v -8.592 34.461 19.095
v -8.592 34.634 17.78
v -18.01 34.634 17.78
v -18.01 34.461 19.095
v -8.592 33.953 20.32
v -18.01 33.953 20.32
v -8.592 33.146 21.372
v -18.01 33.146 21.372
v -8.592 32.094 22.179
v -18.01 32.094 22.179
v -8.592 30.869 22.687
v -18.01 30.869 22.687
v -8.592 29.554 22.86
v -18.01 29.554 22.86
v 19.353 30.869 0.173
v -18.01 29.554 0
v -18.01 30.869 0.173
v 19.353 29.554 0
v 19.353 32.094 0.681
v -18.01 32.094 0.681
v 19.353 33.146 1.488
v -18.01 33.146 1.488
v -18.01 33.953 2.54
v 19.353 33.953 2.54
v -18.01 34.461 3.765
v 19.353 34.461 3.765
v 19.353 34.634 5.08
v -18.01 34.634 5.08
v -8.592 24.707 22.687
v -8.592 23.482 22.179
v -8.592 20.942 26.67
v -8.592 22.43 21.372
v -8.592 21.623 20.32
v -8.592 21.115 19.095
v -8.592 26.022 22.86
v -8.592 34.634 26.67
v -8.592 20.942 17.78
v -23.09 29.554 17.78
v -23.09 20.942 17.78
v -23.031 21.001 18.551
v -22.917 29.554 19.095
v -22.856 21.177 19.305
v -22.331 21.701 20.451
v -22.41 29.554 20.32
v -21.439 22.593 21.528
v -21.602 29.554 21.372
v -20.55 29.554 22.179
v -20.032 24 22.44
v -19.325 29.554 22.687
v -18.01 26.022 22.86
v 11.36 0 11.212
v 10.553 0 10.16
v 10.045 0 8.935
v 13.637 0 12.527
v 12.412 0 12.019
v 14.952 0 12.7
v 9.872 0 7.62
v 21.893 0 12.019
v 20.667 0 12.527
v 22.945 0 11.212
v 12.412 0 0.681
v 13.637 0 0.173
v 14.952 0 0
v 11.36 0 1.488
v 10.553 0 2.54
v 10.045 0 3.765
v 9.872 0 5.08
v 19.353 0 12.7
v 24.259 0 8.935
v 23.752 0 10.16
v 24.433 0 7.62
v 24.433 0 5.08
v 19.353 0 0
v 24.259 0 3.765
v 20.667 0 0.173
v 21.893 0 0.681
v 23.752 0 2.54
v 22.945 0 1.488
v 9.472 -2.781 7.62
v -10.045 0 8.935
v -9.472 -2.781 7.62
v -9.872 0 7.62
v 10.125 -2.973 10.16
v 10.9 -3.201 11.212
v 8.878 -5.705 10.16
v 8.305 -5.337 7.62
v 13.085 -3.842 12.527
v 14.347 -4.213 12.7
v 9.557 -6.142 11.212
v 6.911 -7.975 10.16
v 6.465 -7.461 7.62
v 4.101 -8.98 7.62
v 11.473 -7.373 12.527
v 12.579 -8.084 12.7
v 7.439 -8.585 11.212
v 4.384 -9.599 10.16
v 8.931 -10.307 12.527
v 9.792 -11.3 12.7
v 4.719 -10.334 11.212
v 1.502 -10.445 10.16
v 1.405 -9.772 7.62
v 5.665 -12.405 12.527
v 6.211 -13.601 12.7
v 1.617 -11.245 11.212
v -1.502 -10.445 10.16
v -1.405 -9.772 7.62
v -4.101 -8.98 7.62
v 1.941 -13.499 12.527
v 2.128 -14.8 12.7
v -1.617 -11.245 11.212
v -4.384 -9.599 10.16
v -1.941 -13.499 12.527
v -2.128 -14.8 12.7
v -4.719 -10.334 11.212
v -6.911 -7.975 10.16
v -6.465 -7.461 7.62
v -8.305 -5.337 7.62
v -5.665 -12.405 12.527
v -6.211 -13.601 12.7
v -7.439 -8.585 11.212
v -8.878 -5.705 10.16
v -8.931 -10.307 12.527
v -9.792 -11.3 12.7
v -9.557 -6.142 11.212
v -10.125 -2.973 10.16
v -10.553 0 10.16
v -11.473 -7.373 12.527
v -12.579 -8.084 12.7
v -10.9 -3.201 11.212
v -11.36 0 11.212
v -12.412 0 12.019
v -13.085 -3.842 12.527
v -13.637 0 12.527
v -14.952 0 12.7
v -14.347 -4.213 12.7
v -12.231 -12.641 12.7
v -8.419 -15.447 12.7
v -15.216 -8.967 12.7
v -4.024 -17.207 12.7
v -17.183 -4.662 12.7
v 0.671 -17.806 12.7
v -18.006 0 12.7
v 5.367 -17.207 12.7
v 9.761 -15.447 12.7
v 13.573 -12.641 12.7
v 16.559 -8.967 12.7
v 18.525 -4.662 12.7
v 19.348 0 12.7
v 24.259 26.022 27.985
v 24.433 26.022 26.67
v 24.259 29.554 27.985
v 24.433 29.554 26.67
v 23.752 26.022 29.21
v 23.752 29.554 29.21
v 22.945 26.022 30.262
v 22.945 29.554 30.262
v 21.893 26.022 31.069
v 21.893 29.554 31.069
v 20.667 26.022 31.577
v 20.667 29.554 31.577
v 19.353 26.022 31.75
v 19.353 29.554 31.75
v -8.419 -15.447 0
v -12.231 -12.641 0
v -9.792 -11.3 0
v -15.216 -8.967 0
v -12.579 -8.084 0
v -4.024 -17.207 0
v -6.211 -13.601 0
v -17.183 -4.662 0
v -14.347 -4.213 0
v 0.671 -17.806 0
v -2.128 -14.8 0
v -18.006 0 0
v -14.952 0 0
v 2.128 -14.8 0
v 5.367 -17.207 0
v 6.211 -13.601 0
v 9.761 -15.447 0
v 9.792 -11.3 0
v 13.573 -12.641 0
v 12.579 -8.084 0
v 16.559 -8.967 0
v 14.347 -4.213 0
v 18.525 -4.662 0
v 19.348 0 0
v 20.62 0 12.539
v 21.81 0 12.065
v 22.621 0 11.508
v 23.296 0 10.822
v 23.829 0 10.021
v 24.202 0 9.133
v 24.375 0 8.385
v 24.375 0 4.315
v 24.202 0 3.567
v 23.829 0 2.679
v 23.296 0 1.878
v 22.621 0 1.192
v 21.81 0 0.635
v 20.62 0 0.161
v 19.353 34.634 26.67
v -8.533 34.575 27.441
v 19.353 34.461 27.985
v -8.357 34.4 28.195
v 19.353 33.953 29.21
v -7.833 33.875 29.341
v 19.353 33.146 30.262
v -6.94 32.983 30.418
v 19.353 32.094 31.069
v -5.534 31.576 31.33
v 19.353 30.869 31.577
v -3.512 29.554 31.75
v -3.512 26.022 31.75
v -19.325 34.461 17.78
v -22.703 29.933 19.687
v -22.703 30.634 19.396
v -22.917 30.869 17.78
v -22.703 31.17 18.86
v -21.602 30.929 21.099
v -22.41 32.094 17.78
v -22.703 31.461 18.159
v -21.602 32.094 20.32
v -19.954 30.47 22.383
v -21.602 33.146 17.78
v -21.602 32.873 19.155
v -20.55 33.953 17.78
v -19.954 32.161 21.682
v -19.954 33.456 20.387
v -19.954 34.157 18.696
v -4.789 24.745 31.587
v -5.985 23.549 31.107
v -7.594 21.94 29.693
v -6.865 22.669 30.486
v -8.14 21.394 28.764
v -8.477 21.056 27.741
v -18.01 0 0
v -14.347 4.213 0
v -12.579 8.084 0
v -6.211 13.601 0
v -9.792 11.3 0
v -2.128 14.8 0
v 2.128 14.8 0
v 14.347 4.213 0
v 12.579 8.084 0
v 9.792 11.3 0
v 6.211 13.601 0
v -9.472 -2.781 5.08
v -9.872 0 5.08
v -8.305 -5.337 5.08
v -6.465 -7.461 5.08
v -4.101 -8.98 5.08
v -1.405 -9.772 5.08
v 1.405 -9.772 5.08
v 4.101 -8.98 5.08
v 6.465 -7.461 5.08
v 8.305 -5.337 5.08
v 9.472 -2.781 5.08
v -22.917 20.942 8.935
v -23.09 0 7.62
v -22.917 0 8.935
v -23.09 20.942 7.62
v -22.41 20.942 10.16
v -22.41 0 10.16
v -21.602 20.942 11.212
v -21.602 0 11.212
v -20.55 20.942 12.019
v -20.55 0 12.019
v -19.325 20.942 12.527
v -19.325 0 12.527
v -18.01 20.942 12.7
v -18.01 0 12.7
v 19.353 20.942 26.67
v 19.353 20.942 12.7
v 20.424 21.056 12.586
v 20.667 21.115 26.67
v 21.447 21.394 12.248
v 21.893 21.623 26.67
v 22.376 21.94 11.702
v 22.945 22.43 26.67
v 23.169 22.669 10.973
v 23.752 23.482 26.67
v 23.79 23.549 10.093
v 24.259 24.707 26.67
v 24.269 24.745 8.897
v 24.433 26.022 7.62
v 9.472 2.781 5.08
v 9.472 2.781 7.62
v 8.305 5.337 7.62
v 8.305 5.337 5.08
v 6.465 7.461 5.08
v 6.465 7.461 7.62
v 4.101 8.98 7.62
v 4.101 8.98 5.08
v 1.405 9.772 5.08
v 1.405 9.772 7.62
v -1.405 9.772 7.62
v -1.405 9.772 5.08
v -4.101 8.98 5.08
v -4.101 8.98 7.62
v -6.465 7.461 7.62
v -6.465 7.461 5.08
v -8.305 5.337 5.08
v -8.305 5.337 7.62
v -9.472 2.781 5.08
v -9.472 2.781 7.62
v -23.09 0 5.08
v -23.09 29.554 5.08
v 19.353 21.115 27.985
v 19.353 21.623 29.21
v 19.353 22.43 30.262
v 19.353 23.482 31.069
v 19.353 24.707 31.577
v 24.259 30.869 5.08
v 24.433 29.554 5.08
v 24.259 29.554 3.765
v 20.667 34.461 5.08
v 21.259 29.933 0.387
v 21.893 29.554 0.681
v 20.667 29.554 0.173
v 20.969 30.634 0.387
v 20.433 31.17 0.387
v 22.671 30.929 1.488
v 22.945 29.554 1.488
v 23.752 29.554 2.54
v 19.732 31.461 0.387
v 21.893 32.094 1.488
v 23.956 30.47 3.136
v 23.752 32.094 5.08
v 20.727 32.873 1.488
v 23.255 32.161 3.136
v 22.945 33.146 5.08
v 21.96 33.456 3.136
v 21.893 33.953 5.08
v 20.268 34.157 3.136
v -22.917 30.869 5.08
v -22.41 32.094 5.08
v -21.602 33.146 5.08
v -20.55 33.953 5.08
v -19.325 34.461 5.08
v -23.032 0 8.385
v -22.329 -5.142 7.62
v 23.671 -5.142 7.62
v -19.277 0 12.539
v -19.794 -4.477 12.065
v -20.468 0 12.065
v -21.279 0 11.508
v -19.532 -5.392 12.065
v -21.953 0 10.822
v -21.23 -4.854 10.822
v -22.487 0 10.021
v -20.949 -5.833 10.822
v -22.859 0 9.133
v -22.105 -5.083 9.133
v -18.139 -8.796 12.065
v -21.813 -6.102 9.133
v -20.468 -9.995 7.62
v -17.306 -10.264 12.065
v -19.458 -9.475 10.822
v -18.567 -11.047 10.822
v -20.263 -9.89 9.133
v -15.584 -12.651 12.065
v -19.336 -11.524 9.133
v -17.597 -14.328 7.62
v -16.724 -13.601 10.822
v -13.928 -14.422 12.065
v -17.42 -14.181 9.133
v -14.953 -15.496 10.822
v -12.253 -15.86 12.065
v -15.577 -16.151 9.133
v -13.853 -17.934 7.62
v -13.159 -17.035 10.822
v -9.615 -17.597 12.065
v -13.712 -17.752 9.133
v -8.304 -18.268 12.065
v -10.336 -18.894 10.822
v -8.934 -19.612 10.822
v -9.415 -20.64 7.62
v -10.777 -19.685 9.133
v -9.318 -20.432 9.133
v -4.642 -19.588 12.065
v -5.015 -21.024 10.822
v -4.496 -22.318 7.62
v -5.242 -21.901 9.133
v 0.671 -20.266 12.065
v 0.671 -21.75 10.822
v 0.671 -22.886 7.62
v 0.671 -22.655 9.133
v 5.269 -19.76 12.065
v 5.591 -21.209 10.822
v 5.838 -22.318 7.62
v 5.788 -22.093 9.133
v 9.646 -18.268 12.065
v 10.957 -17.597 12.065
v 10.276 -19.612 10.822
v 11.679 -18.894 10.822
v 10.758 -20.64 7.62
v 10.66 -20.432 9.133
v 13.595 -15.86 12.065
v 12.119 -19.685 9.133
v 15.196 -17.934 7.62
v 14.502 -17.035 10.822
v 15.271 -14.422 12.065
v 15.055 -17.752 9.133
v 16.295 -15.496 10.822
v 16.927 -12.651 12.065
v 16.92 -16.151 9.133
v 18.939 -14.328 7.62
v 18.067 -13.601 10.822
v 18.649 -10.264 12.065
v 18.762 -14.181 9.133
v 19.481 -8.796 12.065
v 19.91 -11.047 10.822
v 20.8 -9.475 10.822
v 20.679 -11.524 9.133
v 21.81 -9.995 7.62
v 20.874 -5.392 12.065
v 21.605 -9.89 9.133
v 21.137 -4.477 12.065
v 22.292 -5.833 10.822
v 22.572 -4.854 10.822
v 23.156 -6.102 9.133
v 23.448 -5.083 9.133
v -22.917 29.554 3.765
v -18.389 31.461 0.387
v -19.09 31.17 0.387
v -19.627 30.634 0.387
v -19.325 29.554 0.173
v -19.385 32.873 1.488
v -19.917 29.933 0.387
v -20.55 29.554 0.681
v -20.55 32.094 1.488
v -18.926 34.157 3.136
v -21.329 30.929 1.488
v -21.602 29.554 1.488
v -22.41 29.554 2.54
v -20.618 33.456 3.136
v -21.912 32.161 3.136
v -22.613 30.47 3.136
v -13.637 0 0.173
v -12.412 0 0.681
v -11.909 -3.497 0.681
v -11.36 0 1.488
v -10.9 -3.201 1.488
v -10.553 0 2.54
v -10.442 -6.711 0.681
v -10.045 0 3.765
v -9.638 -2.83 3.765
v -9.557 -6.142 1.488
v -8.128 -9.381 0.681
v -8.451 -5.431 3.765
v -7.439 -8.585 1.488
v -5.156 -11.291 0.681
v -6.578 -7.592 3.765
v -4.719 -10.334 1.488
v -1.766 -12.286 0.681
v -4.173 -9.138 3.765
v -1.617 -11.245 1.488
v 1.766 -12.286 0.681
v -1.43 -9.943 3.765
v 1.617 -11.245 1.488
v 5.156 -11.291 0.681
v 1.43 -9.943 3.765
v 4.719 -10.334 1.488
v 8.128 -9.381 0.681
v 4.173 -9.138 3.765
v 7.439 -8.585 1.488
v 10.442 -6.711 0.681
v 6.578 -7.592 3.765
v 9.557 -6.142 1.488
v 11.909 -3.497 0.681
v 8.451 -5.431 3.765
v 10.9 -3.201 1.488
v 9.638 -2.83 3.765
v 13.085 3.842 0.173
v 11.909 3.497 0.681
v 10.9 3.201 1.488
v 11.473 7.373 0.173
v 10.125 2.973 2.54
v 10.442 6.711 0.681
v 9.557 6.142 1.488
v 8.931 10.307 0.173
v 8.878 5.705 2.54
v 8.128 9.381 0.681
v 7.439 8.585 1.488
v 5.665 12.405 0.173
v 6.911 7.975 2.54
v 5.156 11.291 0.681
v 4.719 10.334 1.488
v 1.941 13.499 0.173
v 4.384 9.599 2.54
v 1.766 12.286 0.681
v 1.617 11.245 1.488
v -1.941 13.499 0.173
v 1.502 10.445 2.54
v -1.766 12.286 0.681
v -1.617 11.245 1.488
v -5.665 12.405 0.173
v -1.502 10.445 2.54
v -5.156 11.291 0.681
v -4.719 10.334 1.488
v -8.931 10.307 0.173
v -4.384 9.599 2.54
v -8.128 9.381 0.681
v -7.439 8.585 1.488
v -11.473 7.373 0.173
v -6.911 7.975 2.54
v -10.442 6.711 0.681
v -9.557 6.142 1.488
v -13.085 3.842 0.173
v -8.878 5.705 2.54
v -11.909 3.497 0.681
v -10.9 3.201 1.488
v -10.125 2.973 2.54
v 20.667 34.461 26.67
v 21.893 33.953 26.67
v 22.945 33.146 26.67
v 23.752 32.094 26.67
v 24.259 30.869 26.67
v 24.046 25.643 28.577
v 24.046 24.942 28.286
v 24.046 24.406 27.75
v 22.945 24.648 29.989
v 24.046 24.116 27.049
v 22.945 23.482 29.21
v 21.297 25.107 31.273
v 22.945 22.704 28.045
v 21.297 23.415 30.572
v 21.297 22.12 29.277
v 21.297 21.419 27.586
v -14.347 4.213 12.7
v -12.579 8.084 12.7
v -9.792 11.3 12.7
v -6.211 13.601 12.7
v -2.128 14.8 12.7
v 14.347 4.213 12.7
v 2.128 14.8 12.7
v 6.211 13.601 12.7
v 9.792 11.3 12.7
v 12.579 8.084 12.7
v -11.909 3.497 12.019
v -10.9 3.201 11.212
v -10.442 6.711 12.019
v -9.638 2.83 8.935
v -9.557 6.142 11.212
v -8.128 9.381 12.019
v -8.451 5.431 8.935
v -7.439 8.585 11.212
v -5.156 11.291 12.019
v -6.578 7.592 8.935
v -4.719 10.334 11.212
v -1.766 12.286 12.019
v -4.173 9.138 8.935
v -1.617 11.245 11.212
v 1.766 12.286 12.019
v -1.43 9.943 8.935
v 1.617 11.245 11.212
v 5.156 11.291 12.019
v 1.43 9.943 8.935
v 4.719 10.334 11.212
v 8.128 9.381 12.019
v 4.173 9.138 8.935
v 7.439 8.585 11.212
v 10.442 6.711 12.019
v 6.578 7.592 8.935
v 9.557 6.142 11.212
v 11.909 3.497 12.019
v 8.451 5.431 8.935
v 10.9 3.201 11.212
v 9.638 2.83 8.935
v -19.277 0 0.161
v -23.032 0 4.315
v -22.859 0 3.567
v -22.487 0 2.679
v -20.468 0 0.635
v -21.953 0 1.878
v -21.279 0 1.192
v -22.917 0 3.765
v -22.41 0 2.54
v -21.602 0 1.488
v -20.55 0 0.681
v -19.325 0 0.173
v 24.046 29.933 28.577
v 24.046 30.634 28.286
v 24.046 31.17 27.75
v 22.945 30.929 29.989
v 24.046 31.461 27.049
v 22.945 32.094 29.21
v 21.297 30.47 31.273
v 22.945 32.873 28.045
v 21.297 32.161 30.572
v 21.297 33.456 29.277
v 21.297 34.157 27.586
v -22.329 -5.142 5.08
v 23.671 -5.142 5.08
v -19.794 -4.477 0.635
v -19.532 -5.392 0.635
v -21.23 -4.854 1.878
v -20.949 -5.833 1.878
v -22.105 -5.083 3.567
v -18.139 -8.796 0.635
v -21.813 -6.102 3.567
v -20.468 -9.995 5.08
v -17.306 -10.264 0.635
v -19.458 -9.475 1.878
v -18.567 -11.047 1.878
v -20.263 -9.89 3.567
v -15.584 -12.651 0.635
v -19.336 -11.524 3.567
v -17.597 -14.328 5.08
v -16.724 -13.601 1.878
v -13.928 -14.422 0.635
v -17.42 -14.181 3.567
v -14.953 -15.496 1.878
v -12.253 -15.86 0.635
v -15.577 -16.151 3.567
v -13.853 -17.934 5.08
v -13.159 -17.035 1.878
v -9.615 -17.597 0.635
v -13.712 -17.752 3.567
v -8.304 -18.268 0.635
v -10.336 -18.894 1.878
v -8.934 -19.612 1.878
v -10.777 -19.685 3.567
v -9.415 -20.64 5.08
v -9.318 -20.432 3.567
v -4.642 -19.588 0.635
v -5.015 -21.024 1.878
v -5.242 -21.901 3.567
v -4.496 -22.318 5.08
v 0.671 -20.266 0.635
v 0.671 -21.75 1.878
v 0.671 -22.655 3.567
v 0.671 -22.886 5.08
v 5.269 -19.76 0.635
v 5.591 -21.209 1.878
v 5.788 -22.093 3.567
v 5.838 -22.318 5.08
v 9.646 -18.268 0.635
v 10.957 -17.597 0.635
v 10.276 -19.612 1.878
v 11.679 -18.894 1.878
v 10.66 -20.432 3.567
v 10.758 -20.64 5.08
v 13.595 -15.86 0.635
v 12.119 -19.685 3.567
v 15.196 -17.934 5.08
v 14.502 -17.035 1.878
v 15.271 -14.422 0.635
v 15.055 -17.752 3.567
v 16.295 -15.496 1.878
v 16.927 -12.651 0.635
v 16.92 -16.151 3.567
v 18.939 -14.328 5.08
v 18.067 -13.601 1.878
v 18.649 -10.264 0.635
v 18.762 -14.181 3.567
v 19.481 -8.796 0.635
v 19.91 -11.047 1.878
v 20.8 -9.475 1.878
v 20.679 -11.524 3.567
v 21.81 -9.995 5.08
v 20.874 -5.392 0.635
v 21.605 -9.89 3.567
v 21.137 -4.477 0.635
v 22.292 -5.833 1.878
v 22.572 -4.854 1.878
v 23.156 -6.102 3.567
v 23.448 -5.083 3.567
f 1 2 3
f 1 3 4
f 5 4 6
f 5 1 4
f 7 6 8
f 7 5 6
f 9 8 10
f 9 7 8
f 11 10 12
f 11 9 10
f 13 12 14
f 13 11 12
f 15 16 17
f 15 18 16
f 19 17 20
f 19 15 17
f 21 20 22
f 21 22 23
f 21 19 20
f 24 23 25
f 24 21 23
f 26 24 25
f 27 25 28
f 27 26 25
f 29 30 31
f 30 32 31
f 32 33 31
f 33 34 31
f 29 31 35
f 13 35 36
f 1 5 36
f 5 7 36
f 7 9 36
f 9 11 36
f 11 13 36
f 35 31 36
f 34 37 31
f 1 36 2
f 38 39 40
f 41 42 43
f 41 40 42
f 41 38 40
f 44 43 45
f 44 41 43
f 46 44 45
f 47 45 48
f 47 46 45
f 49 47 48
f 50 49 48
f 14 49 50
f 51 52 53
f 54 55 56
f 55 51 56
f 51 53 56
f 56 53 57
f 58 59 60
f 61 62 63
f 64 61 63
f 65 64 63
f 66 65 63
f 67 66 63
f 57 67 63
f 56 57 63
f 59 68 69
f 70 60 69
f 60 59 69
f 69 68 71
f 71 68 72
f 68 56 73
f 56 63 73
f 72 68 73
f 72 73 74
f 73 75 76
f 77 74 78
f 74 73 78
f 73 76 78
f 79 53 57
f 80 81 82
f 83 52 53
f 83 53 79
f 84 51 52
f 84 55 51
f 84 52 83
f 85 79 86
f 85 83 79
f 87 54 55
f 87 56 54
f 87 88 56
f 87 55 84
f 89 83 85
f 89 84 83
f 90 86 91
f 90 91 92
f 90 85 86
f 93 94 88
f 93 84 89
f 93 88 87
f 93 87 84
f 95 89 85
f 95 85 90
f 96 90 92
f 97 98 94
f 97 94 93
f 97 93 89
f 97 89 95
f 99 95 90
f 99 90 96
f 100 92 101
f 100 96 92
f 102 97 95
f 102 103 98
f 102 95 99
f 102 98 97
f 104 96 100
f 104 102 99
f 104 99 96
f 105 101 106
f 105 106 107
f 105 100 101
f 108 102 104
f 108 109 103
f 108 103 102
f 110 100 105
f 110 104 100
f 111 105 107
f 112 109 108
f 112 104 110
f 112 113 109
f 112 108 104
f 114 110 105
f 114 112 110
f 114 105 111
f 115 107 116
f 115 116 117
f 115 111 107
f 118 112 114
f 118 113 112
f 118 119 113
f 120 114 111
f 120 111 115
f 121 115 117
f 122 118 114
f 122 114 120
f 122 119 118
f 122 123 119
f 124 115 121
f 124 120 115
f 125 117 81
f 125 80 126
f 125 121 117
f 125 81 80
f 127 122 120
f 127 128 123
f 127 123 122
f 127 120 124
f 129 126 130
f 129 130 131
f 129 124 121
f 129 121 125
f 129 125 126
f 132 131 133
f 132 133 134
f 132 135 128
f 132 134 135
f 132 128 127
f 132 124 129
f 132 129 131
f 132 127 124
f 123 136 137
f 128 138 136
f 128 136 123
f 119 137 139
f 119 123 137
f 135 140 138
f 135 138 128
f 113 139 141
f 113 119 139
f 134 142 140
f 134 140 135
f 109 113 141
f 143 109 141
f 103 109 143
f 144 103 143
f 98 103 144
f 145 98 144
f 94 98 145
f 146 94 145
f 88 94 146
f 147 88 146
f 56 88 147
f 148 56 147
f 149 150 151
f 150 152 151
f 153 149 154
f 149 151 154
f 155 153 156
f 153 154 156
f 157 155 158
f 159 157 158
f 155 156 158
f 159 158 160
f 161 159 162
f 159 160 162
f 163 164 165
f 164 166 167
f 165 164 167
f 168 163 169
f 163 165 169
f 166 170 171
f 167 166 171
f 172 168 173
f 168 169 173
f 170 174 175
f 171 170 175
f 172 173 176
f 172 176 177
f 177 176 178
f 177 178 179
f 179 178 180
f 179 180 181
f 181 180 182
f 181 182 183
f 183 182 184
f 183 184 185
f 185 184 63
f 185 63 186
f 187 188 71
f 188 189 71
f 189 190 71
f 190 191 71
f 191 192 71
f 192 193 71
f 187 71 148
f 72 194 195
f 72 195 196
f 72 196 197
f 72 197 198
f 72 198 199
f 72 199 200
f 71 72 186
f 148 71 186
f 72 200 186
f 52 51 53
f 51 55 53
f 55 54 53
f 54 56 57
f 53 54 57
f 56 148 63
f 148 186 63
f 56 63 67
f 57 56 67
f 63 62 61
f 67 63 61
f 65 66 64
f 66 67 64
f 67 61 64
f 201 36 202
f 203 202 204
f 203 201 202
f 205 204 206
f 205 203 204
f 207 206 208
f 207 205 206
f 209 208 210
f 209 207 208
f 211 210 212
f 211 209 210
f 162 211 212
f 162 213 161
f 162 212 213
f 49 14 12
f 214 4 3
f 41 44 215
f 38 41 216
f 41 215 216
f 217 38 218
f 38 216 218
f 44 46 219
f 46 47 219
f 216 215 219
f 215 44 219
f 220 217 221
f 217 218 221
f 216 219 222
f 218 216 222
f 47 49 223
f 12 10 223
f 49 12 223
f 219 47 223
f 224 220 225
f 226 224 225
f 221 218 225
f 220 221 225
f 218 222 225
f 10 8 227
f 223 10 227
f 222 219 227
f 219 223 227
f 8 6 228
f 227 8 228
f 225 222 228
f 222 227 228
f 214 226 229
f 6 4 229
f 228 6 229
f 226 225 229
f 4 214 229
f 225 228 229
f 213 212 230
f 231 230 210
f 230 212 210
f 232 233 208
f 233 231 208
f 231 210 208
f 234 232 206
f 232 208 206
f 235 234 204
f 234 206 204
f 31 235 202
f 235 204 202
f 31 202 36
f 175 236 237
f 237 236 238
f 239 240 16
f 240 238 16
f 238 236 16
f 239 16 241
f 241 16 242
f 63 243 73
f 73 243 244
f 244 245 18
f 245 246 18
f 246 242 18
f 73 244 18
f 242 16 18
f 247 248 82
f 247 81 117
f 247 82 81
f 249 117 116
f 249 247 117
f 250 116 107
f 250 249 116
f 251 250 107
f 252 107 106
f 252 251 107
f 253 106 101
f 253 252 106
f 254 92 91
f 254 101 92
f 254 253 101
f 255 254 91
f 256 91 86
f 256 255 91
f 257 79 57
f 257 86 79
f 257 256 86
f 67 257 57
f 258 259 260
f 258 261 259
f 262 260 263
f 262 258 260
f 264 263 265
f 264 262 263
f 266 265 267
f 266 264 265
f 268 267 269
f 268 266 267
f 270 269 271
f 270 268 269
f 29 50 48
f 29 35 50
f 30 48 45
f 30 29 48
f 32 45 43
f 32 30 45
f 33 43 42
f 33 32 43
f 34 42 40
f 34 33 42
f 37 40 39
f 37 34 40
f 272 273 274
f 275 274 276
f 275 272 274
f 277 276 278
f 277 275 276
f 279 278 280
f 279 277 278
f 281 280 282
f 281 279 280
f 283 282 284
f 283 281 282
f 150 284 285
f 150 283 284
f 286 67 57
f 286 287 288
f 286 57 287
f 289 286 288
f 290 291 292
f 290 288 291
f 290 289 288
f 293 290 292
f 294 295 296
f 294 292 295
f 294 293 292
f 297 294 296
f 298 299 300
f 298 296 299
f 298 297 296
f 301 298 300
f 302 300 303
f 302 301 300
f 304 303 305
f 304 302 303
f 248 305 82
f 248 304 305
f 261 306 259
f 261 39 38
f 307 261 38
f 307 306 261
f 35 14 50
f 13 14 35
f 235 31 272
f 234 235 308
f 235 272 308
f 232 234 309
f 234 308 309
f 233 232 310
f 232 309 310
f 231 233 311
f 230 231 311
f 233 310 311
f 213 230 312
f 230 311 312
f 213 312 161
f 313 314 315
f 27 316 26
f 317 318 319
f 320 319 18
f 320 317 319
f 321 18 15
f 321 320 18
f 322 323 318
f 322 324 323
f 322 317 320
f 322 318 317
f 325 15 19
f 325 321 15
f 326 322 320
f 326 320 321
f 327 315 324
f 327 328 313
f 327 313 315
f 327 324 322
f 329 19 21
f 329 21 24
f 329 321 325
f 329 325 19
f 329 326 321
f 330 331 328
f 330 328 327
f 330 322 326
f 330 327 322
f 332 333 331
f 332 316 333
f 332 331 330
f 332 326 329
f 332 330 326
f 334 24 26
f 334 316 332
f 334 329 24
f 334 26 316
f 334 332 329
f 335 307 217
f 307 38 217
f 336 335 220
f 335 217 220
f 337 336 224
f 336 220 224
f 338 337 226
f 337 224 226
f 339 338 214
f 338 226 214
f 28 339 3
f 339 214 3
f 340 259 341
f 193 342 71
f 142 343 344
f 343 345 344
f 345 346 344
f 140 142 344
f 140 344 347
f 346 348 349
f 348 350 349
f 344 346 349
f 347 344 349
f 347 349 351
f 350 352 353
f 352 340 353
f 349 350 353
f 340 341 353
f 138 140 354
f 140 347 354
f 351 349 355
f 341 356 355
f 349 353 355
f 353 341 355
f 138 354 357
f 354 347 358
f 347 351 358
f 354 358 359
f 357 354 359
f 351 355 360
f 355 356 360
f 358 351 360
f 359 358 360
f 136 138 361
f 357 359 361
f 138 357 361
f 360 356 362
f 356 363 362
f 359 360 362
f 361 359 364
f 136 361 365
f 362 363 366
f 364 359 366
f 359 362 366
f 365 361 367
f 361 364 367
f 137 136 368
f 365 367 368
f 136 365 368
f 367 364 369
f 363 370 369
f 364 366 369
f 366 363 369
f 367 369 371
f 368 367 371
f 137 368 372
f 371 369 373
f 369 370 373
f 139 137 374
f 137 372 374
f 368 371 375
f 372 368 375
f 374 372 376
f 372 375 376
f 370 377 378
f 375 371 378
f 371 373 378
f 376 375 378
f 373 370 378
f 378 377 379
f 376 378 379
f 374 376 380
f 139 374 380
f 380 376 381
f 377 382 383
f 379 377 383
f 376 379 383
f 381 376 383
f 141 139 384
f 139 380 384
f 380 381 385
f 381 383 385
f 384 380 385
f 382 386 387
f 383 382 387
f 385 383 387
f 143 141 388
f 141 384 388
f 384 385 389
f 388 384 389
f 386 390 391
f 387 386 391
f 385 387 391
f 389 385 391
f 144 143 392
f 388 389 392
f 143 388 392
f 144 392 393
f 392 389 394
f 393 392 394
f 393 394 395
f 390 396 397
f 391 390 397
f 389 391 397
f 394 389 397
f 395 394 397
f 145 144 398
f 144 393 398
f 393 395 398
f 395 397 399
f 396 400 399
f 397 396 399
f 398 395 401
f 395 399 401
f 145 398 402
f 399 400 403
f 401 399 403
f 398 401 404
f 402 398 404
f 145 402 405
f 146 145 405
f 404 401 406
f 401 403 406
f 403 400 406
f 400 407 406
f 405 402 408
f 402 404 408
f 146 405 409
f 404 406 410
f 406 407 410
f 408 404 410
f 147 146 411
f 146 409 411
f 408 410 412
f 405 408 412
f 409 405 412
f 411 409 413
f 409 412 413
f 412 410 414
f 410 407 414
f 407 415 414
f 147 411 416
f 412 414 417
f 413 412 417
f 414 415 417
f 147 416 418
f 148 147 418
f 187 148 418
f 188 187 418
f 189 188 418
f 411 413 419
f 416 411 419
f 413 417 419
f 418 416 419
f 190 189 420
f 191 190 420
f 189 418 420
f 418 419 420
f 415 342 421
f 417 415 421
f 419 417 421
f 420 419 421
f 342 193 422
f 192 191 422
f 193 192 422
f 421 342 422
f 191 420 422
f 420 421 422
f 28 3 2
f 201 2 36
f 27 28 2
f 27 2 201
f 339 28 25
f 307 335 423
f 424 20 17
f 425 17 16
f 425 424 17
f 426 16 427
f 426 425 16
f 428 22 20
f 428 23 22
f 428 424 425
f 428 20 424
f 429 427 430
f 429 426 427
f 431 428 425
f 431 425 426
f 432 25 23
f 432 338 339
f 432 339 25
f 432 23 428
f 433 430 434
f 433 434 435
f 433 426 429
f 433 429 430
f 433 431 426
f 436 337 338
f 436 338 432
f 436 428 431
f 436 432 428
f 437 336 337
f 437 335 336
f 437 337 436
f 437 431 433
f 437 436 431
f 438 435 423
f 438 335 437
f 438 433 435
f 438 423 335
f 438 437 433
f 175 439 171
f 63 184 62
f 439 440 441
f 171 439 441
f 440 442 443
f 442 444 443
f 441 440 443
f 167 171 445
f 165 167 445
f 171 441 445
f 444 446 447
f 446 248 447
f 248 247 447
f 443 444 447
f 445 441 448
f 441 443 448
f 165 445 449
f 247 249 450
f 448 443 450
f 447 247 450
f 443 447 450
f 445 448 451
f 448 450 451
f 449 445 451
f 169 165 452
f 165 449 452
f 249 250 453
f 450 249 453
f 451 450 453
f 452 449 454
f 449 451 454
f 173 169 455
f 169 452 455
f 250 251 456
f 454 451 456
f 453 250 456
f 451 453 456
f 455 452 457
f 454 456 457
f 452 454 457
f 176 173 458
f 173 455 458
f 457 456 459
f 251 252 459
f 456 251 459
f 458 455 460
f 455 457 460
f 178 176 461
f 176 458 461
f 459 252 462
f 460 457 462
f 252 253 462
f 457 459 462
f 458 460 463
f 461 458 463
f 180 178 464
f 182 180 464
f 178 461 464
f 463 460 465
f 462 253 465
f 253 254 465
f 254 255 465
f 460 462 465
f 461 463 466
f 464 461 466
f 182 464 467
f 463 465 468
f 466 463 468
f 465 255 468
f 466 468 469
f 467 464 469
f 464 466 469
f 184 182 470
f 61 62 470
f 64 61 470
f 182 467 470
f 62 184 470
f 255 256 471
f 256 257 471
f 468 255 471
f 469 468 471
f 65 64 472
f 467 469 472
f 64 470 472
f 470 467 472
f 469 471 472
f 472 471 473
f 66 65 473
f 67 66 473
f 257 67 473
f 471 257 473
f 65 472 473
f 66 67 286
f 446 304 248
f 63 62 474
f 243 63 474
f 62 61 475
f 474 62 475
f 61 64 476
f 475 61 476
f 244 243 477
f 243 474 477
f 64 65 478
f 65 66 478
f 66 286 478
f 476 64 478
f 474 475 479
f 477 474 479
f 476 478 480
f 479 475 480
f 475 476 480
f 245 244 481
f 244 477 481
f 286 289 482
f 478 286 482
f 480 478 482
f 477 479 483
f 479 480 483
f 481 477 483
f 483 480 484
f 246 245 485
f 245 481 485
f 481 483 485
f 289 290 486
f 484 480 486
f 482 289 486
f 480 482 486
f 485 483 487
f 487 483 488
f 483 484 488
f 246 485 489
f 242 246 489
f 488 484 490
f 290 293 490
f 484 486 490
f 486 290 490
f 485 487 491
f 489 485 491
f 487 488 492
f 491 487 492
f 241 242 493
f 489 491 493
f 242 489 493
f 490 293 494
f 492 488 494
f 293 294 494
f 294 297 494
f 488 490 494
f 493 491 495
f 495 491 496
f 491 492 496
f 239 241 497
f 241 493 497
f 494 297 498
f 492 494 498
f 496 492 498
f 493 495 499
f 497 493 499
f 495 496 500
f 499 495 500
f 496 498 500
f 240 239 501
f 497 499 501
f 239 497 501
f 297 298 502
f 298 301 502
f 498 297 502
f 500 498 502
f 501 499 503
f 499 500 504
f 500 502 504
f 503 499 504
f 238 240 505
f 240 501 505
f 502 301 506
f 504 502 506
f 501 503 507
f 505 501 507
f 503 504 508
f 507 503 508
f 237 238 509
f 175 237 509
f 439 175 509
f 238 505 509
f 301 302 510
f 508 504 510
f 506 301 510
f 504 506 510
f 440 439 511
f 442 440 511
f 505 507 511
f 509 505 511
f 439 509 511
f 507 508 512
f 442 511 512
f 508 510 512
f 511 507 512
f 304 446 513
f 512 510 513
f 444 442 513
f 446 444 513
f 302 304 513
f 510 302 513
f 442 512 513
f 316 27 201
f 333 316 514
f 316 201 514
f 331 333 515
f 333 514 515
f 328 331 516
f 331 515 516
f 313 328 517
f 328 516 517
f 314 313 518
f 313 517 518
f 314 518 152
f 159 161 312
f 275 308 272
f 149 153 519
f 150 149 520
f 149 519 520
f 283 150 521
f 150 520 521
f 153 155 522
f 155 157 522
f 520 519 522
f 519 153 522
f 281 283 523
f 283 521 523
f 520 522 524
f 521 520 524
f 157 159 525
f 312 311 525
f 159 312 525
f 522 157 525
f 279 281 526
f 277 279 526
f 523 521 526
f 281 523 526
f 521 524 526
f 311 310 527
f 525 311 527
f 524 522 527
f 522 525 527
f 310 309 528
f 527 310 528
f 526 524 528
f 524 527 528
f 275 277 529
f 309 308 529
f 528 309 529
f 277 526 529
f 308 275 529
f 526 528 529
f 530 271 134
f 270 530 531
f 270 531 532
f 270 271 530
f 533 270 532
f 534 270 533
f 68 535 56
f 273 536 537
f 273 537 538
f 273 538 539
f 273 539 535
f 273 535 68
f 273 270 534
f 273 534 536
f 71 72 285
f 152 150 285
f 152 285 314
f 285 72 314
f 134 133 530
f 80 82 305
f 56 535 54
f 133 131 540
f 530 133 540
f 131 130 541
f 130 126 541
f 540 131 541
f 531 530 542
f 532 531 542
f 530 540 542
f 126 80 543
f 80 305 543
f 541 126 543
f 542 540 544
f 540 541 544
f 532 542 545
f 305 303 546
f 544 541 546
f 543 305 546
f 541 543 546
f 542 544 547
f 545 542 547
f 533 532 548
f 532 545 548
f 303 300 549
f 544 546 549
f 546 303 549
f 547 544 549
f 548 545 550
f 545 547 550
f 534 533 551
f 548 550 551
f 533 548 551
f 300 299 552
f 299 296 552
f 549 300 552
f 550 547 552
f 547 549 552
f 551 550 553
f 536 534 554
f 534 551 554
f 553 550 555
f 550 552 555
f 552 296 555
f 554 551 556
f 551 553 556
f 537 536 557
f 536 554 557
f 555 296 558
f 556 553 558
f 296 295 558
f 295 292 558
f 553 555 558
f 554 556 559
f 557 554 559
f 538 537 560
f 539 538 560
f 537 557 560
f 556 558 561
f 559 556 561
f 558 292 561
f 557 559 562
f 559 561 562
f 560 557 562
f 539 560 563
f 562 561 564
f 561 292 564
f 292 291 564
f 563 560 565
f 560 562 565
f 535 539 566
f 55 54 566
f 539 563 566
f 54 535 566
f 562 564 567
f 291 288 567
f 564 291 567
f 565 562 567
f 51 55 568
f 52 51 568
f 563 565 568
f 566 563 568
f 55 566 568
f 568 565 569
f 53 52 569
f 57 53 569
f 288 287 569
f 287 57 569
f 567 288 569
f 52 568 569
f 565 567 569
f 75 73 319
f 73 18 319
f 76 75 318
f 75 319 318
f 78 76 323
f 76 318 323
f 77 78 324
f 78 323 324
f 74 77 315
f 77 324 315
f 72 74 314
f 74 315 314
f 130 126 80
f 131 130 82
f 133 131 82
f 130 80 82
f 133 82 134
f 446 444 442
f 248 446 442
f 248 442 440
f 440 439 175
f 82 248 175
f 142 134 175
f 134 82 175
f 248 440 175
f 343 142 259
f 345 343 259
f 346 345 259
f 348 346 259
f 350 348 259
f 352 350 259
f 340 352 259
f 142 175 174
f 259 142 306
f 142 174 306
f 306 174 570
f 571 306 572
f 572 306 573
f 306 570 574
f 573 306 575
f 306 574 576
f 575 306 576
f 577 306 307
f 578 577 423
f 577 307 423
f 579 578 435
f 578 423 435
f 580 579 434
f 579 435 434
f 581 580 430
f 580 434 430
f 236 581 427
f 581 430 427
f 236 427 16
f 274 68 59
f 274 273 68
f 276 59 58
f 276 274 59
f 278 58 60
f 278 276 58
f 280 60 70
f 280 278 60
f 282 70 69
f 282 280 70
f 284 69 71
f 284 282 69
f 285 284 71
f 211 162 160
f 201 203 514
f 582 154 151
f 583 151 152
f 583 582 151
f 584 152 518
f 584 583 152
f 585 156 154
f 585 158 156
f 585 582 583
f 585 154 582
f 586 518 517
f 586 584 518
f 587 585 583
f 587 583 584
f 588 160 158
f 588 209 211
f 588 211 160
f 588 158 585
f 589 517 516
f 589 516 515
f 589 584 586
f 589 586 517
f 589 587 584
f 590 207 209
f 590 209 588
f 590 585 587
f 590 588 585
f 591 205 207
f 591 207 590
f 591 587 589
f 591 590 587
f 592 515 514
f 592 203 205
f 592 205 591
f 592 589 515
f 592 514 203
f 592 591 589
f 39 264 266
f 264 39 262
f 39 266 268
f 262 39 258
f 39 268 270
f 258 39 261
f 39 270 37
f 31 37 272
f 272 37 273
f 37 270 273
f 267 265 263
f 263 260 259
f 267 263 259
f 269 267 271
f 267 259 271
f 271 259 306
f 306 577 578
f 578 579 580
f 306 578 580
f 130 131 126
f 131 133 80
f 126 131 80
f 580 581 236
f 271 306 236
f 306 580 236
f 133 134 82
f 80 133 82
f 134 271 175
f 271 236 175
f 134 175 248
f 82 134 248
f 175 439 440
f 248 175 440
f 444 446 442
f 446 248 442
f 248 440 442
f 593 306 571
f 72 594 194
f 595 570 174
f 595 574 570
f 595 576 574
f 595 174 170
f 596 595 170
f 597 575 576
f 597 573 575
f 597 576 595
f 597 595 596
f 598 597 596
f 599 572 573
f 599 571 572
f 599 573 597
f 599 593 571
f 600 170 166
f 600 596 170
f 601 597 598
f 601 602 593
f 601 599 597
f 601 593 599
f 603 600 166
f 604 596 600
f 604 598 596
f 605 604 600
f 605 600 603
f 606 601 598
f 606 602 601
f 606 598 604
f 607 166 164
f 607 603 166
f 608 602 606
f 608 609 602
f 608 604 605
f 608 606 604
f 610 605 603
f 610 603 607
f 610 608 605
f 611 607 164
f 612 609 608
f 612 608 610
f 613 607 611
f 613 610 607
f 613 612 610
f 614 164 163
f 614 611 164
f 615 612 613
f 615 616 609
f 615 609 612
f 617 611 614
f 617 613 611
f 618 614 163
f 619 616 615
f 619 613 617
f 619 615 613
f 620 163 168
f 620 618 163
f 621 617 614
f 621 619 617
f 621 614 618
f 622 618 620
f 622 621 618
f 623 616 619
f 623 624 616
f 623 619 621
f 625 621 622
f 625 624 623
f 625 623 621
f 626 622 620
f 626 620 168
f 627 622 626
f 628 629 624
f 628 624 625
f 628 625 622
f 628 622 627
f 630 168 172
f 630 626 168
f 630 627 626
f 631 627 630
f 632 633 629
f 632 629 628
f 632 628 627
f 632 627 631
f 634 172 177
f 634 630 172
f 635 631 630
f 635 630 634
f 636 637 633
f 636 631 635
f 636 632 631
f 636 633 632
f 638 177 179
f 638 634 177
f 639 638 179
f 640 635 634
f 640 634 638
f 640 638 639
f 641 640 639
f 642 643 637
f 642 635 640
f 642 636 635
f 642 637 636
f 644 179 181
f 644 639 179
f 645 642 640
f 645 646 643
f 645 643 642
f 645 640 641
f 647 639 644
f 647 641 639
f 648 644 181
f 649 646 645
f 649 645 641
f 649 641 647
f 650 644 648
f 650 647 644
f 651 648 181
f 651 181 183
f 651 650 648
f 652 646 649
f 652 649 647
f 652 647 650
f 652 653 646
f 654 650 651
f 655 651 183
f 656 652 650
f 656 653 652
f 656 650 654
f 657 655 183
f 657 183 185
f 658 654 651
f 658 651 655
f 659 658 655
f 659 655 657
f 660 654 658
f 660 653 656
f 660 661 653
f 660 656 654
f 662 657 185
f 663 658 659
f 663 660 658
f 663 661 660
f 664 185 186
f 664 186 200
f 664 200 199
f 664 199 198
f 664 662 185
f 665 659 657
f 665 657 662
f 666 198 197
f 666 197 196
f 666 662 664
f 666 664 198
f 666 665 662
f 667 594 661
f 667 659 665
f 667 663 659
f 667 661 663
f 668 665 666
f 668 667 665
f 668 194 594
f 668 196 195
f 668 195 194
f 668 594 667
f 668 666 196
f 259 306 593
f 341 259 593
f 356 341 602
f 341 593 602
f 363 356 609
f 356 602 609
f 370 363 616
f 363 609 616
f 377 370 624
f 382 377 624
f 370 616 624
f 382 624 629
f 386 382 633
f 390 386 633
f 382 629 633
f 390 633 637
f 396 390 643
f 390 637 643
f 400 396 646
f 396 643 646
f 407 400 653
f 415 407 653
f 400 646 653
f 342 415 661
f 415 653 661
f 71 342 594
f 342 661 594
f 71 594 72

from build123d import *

# Parameters (mm, degrees)
F2_DEPTH = 12.7
F1_W     = 47.5227199495
F1_H     = 34.6339703538
F3_W     = 47.5227199495
F3_H     = 13.6917554773
F4_DEPTH = 19.05
F5_W     = 14.4984591752
F5_H     = 13.6917554773
F6_DEPTH = 8.89
F7_R     = 9.8722552071
F8_DEPTH = 31.751
F10_R    = 5.08
F10_2_R  = 5.08


# Not quite as in the source:
# - a feature of the source that left no trace in its solid (it failed there, or was rolled back) is left out


with BuildPart() as f2:
    # F0 (on Top) → F2 (new body)
    with BuildSketch(Plane.XY):
        with BuildLine():
            Line((24.4325827807, 0), (-23.0901371688, 0))
            ThreePointArc((-23.0901371688, 0), (0.671222806, -22.885776239), (24.4325827807, 0))
        make_face()
    extrude(amount=F2_DEPTH)


with BuildPart() as f2b:
    # F1 (on Top) → F2, piece 2 (new body)
    with BuildSketch(Plane.XY):
        with Locations((0.671222806, 17.3169851769)):
            Rectangle(F1_W, F1_H)
    extrude(amount=F2_DEPTH)

    # F3 (on face) → F4 (join)
    with BuildSketch(Plane.XY.offset(12.7)):
        with Locations((0.671222806, 27.7880926151)):
            Rectangle(F3_W, F3_H)
    extrude(amount=F4_DEPTH)

    # F5 (on face) → F6 (cut)
    with BuildSketch(Plane.XY.offset(31.75)):
        with Locations((-15.8409075812, 27.7880926151)):
            Rectangle(F5_W, F5_H)
    extrude(amount=-F6_DEPTH, mode=Mode.SUBTRACT)


with BuildPart() as f8_tool:
    # F7 (on Top) → F8 (new body, through all)
    with BuildSketch(Plane.XY):
        Circle(F7_R)
    extrude(amount=F8_DEPTH)


with BuildPart() as f2_1:
    add(f2.part)

    # F8: cut by f8_tool
    add(f8_tool.part, mode=Mode.SUBTRACT)

    # F10#2
    f10_2_edges = [f2_1.edges().sort_by_distance(p)[0] for p in [
        (0.671223, -22.885776, 0),
        (0, -9.872255, 0),
        (0, -9.872255, 12.7),
        (0.671223, -22.885776, 12.7),
    ]]
    fillet(f10_2_edges, radius=F10_2_R)


with BuildPart() as f2b_1:
    add(f2b.part)

    # F8: cut by f8_tool
    add(f8_tool.part, mode=Mode.SUBTRACT)

    # F10
    f10_edges = [f2b_1.edges().sort_by_distance(p)[0] for p in [
        (7.920452, 20.942215, 31.75),
        (-15.840908, 20.942215, 22.86),
        (-8.591678, 27.788093, 31.75),
        (7.920452, 34.63397, 31.75),
        (24.432583, 27.788093, 31.75),
        (-15.840908, 34.63397, 22.86),
        (-23.090137, 27.788093, 22.86),
        (-23.090137, 34.63397, 11.43),
        (24.432583, 34.63397, 15.875),
        (24.432583, 20.942215, 22.225),
        (24.432583, 10.471107, 12.7),
        (24.432583, 17.316985, 0),
        (0, 9.872255, 12.7),
        (-23.090137, 10.471107, 12.7),
        (0.671223, 34.63397, 0),
        (0, 9.872255, 0),
        (-23.090137, 17.316985, 0),
    ]]
    fillet(f10_edges, radius=F10_R)


solid = Compound([f2_1.part, f2b_1.part])
